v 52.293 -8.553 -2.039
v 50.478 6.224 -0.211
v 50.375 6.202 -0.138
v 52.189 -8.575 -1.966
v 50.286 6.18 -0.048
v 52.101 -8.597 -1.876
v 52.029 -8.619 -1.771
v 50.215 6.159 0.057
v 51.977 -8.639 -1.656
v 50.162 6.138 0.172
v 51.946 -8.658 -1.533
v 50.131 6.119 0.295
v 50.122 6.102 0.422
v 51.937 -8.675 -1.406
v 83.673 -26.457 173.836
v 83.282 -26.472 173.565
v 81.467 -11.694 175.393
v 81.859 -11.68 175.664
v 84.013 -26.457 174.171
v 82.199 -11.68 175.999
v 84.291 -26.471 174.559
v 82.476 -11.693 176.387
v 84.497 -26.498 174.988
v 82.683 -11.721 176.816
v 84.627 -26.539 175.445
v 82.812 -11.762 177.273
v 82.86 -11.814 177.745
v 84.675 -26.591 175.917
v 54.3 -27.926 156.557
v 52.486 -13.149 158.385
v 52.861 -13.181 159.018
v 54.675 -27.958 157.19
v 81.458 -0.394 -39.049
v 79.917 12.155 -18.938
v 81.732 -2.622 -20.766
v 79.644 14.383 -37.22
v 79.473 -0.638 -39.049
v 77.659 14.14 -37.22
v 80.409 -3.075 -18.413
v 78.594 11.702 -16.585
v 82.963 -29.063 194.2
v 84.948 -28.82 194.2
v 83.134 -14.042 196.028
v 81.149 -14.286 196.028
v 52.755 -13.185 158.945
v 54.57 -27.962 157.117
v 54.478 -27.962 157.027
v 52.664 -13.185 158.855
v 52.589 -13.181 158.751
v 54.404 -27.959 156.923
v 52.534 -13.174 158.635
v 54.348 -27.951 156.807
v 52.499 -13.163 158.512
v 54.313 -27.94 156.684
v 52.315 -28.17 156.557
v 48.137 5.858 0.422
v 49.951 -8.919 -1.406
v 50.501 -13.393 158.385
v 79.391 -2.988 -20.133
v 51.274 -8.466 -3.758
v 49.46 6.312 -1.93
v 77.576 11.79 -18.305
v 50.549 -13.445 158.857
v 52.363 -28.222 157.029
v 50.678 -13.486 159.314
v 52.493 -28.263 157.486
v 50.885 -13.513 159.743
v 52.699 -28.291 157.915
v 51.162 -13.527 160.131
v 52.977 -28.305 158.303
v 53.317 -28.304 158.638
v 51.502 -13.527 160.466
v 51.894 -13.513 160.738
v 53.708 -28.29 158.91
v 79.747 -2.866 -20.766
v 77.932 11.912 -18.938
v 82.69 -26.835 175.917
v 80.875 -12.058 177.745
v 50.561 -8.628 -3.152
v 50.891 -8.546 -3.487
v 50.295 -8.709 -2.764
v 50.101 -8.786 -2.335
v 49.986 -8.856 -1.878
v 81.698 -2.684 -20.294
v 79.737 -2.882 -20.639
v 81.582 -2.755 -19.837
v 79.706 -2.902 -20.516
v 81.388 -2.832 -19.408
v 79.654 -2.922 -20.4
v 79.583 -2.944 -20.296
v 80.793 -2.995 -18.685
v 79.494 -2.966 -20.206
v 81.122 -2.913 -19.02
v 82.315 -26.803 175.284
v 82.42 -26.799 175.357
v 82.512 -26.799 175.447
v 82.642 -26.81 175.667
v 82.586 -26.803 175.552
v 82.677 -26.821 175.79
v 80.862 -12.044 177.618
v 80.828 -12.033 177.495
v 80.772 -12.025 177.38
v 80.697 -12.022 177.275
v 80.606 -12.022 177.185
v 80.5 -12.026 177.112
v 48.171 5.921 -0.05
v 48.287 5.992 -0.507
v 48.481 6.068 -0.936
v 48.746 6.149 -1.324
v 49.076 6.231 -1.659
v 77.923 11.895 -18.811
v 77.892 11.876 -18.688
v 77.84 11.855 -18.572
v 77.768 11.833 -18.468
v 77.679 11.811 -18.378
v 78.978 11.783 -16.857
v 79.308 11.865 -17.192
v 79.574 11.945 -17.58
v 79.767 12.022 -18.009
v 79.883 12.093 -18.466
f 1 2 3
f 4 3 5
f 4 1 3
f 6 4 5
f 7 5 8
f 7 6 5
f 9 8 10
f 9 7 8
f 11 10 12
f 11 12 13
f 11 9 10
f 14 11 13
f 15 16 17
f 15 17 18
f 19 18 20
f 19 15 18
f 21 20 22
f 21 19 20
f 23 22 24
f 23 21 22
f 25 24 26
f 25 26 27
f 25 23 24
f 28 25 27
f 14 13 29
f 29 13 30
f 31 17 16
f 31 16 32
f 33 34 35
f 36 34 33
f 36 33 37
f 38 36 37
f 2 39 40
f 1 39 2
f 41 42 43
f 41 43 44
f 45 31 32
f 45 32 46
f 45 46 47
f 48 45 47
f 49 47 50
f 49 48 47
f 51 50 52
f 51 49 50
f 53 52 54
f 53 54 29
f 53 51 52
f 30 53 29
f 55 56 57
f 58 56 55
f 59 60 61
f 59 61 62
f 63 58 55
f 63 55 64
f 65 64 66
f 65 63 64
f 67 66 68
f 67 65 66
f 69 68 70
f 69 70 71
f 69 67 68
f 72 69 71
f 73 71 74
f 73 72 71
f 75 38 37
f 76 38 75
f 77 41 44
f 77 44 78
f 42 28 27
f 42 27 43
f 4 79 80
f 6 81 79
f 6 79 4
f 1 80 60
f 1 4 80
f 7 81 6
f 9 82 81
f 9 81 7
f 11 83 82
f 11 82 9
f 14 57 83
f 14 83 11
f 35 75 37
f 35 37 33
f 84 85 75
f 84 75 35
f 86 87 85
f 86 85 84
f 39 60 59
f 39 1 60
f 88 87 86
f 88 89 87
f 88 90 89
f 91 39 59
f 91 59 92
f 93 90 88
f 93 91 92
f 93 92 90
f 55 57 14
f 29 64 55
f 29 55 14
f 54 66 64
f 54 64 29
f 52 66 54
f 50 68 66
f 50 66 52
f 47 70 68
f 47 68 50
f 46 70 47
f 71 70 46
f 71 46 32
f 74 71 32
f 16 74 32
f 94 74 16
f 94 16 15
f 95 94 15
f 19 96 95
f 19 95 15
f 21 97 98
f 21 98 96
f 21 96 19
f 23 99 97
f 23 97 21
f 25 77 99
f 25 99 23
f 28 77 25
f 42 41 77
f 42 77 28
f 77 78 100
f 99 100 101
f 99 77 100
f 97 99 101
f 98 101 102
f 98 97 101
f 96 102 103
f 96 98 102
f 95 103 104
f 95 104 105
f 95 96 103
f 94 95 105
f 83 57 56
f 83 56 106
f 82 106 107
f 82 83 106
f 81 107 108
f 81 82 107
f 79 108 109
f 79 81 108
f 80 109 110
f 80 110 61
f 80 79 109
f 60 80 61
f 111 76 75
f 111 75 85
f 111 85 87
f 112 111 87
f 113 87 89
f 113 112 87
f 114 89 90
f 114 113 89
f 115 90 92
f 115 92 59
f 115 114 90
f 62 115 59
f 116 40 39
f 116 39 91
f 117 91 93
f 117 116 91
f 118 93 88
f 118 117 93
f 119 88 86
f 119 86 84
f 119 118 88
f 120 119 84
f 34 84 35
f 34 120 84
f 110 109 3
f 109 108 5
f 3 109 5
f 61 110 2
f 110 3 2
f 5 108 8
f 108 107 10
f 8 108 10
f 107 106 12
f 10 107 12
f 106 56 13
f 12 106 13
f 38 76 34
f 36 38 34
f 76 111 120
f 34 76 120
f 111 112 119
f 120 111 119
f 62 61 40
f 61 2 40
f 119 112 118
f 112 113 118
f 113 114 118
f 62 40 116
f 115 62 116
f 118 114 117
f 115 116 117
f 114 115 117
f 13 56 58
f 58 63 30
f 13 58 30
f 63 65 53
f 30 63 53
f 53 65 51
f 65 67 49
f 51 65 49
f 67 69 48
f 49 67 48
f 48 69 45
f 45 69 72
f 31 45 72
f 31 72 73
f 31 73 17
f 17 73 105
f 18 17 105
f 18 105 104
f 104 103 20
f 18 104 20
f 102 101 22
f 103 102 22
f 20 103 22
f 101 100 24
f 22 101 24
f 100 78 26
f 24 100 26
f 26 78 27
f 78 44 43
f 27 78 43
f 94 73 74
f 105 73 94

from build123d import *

# Parameters (mm, degrees)
SKETCH2_W                    = 160
SKETCH2_H                    = 15
BASE_FLANGE1_DEPTH           = 2
EDGE_FLANGE1_STRIP_CUT_DEPTH = 15
EDGE_FLANGE1_DEPTH           = 15
EDGE_FLANGE2_STRIP_CUT_DEPTH = 15
EDGE_FLANGE2_DEPTH           = 15
EDGE_FLANGE3_STRIP_CUT_DEPTH = 15
EDGE_FLANGE3_DEPTH           = 15
EDGE_FLANGE4_STRIP_CUT_DEPTH = 15
EDGE_FLANGE4_DEPTH           = 15


# Sheet-metal steps are written as plain solids
with BuildPart() as part:
    # Sketch2 → Base-Flange1 (new body)
    with BuildSketch(Plane(origin=(48.130685362, 5.909705068, 0), x_dir=(0.014852136862004454, -0.1209609477998444, 0.9925461516413208), z_dir=(-0.9925461516413208, -0.12186934340515826, 0))):
        with Locations((80, -7.5)):
            Rectangle(SKETCH2_W, SKETCH2_H)
    extrude(amount=-BASE_FLANGE1_DEPTH)

    # Edge-Flange1 strip (across the edge) → Edge-Flange1 strip cut (cut)
    with BuildSketch(Plane(origin=(51.930191883, -8.623774192, -1.828040151), x_dir=(0.5091354036436435, -0.04382058195792874, 0.8595701817498632), z_dir=(-0.1209609477998443, 0.9851478631379957, 0.1218693434051582))):
        Polygon((-8.835731855, 2.791911088), (-0.6317, -1.944688912), (0.3683, -0.212638104), (-7.835731855, 4.523961896), align=None)
    extrude(amount=EDGE_FLANGE1_STRIP_CUT_DEPTH, mode=Mode.SUBTRACT)

    # Edge-Flange1 section (across the edge) → Edge-Flange1 (add)
    with BuildSketch(Plane(origin=(51.930191883, -8.623774192, -1.828040151), x_dir=(0.5091354036436435, -0.04382058195792874, 0.8595701817498632), z_dir=(-0.1209609477998443, 0.9851478631379957, 0.1218693434051582))):
        with BuildLine():
            Line((-2, 0.425276208), (-2, 33.845299462))
            Line((-2, 33.845299462), (0, 33.845299462))
            Line((0, 33.845299462), (0, 0.425276208))
            ThreePointArc((0, 0.425276208), (0.098685688, 0.056976208), (0.3683, -0.212638104))
            Line((0.3683, -0.212638104), (-0.6317, -1.944688912))
            ThreePointArc((-0.6317, -1.944688912), (-1.63336512, -0.943023792), (-2, 0.425276208))
        make_face()
    extrude(amount=EDGE_FLANGE1_DEPTH)

    # Edge-Flange2 strip (across the edge) → Edge-Flange2 strip cut (cut)
    with BuildSketch(Plane(origin=(77.938579558, 11.860163483, -18.515651229), x_dir=(-0.9925461516413208, -0.12186934340515852, 0), z_dir=(0.12096094779984468, -0.9851478631379958, -0.12186934340515816))):
        Polygon((-8.835731855, 2.791911088), (-0.6317, -1.944688912), (0.3683, -0.212638104), (-7.835731855, 4.523961896), align=None)
    extrude(amount=EDGE_FLANGE2_STRIP_CUT_DEPTH, mode=Mode.SUBTRACT)

    # Edge-Flange2 section (across the edge) → Edge-Flange2 (add)
    with BuildSketch(Plane(origin=(77.938579558, 11.860163483, -18.515651229), x_dir=(-0.9925461516413208, -0.12186934340515852, 0), z_dir=(0.12096094779984468, -0.9851478631379958, -0.12186934340515816))):
        with BuildLine():
            Line((-2, 0.425276208), (-2, 18.845299462))
            Line((-2, 18.845299462), (0, 18.845299462))
            Line((0, 18.845299462), (0, 0.425276208))
            ThreePointArc((0, 0.425276208), (0.098685688, 0.056976208), (0.3683, -0.212638104))
            Line((0.3683, -0.212638104), (-0.6317, -1.944688912))
            ThreePointArc((-0.6317, -1.944688912), (-1.63336512, -0.943023792), (-2, 0.425276208))
        make_face()
    extrude(amount=EDGE_FLANGE2_DEPTH)

    # Edge-Flange3 strip (across the edge) → Edge-Flange3 strip cut (cut)
    with BuildSketch(Plane(origin=(52.492119564, -13.200307893, 158.807384263), x_dir=(0.48341074799768535, 0.16568992536308802, -0.8595701817498632), z_dir=(0.12096094779984425, -0.9851478631379958, -0.1218693434051584))):
        Polygon((-8.835731855, 2.791911088), (-0.6317, -1.944688912), (0.3683, -0.212638104), (-7.835731855, 4.523961896), align=None)
    extrude(amount=EDGE_FLANGE3_STRIP_CUT_DEPTH, mode=Mode.SUBTRACT)

    # Edge-Flange3 section (across the edge) → Edge-Flange3 (add)
    with BuildSketch(Plane(origin=(52.492119564, -13.200307893, 158.807384263), x_dir=(0.48341074799768535, 0.16568992536308802, -0.8595701817498632), z_dir=(0.12096094779984425, -0.9851478631379958, -0.1218693434051584))):
        with BuildLine():
            Line((-2, 0.425276208), (-2, 33.845299462))
            Line((-2, 33.845299462), (0, 33.845299462))
            Line((0, 33.845299462), (0, 0.425276208))
            ThreePointArc((0, 0.425276208), (0.098685688, 0.056976208), (0.3683, -0.212638104))
            Line((0.3683, -0.212638104), (-0.6317, -1.944688912))
            ThreePointArc((-0.6317, -1.944688912), (-1.63336512, -0.943023792), (-2, 0.425276208))
        make_face()
    extrude(amount=EDGE_FLANGE3_DEPTH)

    # Edge-Flange4 strip (across the edge) → Edge-Flange4 strip cut (cut)
    with BuildSketch(Plane(origin=(82.683460004, -26.783786628, 175.494995341), x_dir=(-0.9925461516413208, -0.12186934340515758, 0), z_dir=(-0.12096094779984379, 0.9851478631379957, 0.12186934340515838))):
        Polygon((-8.835731855, 2.791911088), (-0.6317, -1.944688912), (0.3683, -0.212638104), (-7.835731855, 4.523961896), align=None)
    extrude(amount=EDGE_FLANGE4_STRIP_CUT_DEPTH, mode=Mode.SUBTRACT)

    # Edge-Flange4 section (across the edge) → Edge-Flange4 (add)
    with BuildSketch(Plane(origin=(82.683460004, -26.783786628, 175.494995341), x_dir=(-0.9925461516413208, -0.12186934340515758, 0), z_dir=(-0.12096094779984379, 0.9851478631379957, 0.12186934340515838))):
        with BuildLine():
            Line((-2, 0.425276208), (-2, 18.845299462))
            Line((-2, 18.845299462), (0, 18.845299462))
            Line((0, 18.845299462), (0, 0.425276208))
            ThreePointArc((0, 0.425276208), (0.098685688, 0.056976208), (0.3683, -0.212638104))
            Line((0.3683, -0.212638104), (-0.6317, -1.944688912))
            ThreePointArc((-0.6317, -1.944688912), (-1.63336512, -0.943023792), (-2, 0.425276208))
        make_face()
    extrude(amount=EDGE_FLANGE4_DEPTH)


solid = part.part
